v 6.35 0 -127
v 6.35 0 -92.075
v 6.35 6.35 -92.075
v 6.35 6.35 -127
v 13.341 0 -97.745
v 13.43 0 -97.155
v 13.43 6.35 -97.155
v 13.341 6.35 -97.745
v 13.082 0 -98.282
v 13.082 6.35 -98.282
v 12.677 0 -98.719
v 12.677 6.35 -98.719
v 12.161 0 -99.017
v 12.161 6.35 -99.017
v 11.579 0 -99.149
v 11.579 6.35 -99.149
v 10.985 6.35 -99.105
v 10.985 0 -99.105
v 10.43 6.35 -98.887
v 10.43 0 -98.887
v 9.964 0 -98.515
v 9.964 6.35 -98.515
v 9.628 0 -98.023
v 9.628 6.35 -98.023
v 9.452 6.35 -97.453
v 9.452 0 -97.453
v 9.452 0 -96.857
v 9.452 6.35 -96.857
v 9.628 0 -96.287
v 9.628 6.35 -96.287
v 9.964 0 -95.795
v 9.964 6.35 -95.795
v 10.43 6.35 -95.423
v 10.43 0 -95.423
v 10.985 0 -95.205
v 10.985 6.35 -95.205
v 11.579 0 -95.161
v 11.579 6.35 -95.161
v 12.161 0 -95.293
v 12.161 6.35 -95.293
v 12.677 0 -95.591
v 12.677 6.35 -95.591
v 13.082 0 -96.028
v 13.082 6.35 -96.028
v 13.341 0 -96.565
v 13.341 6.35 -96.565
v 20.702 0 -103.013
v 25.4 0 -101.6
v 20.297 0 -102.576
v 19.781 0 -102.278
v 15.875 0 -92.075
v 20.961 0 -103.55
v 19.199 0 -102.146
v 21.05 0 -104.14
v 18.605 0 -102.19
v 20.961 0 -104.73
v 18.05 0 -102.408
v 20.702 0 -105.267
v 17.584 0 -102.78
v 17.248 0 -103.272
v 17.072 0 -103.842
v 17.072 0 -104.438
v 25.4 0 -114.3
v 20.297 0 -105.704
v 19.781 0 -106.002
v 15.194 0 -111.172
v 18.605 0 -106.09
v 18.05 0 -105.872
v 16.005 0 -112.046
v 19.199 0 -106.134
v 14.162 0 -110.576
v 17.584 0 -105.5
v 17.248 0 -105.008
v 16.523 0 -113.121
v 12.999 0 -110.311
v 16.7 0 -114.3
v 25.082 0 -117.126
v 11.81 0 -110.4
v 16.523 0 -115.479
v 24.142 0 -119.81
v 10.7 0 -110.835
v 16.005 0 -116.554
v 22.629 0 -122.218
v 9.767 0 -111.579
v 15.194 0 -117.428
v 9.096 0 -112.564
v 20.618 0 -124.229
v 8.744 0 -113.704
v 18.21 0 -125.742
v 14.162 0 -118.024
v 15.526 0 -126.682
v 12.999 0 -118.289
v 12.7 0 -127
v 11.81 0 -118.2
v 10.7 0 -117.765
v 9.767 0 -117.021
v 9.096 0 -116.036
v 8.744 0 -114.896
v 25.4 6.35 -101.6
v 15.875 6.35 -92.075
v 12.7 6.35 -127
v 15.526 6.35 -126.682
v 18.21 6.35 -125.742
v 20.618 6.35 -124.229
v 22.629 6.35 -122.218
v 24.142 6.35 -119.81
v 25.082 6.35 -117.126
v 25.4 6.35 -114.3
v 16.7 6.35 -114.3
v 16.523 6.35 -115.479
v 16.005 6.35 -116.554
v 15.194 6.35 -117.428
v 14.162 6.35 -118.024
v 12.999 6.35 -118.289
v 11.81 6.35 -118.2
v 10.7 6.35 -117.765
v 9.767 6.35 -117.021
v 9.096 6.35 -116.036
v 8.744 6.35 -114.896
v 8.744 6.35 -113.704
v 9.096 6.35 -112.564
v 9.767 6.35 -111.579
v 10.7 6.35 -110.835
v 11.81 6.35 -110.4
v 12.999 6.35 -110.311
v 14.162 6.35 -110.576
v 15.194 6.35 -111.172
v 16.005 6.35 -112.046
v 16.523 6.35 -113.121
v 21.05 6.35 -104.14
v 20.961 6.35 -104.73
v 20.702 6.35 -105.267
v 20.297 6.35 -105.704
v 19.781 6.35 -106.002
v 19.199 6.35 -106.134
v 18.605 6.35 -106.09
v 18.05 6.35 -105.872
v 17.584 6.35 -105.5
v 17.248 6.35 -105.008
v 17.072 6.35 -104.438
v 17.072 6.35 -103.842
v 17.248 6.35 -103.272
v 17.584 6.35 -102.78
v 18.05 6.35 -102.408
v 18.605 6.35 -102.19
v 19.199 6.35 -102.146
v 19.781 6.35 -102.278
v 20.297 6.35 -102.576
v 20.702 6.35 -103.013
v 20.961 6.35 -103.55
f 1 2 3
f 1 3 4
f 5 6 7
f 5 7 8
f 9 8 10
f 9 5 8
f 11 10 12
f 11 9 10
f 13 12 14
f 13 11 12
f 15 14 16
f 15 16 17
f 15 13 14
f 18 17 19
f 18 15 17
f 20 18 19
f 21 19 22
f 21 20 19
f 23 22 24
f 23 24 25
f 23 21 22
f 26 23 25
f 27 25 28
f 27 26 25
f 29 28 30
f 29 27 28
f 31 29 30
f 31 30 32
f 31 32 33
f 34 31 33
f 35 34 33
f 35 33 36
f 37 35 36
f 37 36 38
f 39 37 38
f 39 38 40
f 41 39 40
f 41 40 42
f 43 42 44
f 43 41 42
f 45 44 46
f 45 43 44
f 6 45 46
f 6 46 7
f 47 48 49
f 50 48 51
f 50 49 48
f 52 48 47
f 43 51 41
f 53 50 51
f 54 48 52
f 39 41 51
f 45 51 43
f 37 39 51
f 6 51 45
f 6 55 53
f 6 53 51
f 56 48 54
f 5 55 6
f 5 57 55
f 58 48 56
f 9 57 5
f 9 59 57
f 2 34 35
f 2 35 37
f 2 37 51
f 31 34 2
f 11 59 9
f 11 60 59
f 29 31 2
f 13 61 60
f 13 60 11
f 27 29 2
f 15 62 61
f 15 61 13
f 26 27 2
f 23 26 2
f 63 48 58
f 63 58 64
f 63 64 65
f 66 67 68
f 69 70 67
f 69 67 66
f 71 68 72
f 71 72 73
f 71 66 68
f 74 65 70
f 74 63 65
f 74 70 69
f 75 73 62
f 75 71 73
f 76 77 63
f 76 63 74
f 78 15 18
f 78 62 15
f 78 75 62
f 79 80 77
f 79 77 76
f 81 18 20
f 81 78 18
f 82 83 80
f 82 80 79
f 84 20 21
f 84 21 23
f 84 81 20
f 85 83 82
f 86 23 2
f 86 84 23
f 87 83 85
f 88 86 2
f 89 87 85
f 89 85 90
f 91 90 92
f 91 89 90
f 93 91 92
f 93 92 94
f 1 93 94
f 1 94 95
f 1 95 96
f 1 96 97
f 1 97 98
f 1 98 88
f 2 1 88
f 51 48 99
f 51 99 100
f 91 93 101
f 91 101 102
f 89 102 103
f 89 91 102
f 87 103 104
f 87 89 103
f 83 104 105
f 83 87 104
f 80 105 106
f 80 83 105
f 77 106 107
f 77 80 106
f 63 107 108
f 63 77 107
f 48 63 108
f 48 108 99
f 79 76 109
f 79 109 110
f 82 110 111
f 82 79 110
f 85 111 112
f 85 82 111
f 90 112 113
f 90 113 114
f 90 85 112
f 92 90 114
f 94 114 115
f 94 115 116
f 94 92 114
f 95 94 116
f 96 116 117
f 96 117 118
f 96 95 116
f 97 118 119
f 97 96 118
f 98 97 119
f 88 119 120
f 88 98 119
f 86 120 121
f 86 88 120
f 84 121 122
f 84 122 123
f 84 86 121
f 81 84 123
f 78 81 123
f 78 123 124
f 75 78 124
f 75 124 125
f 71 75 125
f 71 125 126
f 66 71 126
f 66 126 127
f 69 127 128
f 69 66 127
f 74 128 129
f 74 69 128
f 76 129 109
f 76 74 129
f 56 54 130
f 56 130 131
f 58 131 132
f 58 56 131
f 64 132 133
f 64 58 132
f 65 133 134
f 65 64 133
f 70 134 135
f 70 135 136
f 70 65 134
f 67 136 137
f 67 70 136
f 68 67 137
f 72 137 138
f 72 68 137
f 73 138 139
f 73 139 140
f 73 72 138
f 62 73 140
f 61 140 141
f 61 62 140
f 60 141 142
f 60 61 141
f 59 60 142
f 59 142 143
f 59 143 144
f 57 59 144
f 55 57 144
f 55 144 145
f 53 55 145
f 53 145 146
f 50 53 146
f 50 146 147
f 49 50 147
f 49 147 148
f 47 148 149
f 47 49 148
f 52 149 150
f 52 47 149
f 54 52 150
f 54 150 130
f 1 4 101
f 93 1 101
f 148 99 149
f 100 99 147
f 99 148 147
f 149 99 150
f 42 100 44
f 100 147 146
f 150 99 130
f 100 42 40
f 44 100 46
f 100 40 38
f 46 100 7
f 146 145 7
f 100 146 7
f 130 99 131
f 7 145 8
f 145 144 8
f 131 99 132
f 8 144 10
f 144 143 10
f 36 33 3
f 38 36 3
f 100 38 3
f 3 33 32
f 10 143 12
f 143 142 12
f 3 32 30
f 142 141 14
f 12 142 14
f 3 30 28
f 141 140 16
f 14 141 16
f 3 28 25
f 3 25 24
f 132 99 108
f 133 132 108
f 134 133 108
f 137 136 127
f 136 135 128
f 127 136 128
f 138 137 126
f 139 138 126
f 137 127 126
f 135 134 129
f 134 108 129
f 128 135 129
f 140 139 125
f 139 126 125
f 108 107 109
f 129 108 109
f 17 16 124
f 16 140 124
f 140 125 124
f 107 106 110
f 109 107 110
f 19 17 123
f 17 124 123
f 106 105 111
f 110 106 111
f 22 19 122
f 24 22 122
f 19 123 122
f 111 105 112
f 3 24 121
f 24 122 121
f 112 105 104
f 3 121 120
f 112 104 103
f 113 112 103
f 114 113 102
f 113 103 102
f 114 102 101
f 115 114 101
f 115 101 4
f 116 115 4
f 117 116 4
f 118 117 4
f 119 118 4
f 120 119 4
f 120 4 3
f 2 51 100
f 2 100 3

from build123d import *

# Parameters (mm, degrees)
SKETCH2_R           = 2
SKETCH2_R_2         = 4.0005
BOSS_EXTRUDE1_DEPTH = 6.35


with BuildPart() as part:
    # Sketch2 → Boss-Extrude1 (new body)
    with BuildSketch(Plane(origin=(0, 0, 0), x_dir=(1, 0, 0), z_dir=(0, 1, 0))):
        with BuildLine():
            Line((6.35, 127), (12.7, 127))
            ThreePointArc((12.7, 127), (21.680256121, 123.280256121), (25.4, 114.3))
            Line((25.4, 114.3), (25.4, 101.6))
            Line((25.4, 101.6), (15.875, 92.075))
            Line((15.875, 92.075), (6.35, 92.075))
            Line((6.35, 92.075), (6.35, 101.6))
            Line((6.35, 101.6), (6.35, 127))
        make_face()
        with Locations((11.43, 97.155)):
            Circle(SKETCH2_R, mode=Mode.SUBTRACT)
        with Locations((19.05, 104.14)):
            Circle(SKETCH2_R, mode=Mode.SUBTRACT)
        with Locations((12.7, 114.3)):
            Circle(SKETCH2_R_2, mode=Mode.SUBTRACT)
    extrude(amount=BOSS_EXTRUDE1_DEPTH)


solid = part.part
